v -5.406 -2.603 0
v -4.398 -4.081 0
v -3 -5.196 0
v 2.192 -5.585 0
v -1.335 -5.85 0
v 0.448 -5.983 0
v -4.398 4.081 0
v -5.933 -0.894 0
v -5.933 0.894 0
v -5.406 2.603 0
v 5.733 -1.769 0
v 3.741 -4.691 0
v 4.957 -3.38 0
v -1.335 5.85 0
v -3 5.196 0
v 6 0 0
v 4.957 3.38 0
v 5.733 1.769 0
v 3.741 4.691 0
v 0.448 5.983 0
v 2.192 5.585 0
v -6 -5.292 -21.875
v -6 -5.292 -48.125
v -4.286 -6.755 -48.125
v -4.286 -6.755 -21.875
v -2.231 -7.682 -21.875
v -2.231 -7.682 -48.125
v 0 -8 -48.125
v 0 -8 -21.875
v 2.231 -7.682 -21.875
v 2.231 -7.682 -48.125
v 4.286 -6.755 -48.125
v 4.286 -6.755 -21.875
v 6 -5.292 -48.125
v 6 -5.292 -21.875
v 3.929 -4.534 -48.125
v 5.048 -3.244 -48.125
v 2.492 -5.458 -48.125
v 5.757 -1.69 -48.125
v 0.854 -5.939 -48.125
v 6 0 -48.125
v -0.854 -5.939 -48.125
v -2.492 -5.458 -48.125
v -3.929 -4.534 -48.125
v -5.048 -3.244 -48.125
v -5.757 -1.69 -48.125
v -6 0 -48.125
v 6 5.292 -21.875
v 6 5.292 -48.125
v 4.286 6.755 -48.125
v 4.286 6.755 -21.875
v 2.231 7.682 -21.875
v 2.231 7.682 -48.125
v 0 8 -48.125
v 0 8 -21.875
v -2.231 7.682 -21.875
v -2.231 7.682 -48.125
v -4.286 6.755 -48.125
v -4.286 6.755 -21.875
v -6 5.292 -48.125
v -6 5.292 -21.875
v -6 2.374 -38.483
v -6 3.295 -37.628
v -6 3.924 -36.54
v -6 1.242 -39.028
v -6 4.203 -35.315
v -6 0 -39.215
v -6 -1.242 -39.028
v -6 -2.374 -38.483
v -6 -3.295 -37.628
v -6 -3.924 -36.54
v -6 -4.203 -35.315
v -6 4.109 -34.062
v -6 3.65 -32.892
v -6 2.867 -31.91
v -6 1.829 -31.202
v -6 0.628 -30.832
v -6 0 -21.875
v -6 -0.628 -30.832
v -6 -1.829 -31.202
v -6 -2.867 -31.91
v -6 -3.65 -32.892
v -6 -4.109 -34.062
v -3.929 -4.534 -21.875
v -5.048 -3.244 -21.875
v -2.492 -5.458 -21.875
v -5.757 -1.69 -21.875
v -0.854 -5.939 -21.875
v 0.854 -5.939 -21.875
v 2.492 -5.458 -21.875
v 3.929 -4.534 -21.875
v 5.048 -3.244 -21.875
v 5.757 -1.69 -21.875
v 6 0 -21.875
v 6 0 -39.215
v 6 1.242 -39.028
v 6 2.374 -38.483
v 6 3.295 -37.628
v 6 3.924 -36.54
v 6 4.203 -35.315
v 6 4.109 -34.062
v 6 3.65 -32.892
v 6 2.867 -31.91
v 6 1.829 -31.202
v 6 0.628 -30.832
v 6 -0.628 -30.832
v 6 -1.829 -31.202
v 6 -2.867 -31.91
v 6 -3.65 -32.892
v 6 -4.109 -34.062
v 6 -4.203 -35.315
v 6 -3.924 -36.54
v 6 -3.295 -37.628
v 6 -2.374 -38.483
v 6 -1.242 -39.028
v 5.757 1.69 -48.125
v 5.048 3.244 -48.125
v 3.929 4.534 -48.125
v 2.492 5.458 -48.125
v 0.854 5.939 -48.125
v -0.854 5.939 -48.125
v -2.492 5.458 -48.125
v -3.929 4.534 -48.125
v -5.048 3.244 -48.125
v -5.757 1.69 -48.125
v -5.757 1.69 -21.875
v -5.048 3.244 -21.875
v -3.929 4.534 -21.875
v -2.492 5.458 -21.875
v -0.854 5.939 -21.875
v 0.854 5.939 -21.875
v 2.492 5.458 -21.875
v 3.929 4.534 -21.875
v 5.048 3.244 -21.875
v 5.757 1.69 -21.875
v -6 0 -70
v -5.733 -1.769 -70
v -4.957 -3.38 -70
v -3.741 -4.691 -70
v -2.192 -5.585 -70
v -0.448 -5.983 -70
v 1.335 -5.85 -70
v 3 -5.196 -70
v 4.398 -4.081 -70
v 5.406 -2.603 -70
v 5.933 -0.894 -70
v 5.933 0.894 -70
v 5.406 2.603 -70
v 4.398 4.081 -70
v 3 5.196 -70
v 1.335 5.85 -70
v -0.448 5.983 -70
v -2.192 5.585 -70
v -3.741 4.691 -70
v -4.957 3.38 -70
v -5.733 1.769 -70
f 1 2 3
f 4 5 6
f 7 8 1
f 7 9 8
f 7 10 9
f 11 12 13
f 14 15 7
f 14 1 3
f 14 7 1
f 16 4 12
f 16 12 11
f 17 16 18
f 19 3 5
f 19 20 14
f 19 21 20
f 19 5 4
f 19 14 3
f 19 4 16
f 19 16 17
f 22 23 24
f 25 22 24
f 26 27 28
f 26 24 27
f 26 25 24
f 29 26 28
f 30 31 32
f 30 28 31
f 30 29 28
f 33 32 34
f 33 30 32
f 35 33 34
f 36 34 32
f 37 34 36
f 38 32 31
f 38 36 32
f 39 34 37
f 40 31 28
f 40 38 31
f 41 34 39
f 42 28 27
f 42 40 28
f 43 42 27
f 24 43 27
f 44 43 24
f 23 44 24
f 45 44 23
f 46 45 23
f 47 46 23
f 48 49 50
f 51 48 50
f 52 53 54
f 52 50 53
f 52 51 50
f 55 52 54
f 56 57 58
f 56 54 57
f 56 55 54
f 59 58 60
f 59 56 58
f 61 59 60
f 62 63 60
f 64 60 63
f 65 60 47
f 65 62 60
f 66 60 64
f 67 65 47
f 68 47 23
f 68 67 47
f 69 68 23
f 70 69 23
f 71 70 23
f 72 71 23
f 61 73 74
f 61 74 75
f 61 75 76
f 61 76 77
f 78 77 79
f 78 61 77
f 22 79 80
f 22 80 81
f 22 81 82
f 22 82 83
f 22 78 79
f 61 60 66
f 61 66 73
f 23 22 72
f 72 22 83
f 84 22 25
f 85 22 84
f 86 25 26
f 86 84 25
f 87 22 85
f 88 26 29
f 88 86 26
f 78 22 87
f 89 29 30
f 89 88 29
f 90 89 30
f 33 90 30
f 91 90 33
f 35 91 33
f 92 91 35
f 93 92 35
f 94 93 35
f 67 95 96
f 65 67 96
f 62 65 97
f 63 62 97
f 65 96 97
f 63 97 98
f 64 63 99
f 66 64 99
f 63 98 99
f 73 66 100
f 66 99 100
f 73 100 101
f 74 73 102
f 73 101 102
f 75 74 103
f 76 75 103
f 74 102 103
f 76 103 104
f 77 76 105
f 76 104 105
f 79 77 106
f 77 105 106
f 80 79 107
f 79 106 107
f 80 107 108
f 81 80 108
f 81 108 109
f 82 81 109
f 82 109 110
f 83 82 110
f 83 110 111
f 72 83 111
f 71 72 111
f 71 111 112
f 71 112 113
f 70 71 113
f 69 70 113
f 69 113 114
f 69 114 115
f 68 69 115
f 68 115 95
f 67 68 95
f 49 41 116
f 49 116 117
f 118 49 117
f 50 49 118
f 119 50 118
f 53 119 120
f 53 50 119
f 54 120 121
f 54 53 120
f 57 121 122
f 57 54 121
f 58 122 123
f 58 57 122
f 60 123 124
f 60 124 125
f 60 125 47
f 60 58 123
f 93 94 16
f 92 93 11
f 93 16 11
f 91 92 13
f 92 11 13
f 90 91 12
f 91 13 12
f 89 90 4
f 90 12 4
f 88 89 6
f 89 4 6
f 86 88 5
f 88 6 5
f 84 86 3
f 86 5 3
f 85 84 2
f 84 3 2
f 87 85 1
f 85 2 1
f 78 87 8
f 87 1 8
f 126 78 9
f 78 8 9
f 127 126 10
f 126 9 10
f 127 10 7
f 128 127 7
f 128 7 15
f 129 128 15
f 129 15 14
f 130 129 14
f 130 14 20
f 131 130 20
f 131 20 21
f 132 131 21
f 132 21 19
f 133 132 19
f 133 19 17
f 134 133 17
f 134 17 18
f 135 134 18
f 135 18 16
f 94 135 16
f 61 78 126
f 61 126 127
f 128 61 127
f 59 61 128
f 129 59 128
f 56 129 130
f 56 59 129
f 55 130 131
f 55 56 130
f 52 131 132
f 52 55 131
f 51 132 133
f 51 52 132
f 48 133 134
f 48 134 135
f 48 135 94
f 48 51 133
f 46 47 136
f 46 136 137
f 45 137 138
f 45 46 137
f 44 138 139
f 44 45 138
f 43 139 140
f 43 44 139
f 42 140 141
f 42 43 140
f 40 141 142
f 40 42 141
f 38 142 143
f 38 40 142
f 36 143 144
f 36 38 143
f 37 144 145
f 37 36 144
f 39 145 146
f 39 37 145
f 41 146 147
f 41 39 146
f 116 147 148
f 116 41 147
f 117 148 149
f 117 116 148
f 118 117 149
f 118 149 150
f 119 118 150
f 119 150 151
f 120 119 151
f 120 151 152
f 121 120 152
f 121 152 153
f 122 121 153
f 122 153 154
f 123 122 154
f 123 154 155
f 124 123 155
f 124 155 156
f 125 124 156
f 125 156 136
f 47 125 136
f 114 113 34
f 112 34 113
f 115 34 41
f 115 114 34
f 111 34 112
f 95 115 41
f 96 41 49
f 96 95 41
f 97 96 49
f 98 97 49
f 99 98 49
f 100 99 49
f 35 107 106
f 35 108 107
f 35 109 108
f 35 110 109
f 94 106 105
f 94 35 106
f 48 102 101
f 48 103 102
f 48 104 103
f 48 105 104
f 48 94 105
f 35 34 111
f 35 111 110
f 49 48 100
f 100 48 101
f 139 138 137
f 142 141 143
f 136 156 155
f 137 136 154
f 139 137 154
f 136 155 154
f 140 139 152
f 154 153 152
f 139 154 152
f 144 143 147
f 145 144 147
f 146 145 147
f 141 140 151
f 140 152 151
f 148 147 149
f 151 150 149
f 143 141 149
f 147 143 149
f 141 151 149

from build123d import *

# Parameters (mm, degrees)
SKETCH2_R           = 6
BOSS_EXTRUDE2_DEPTH = 70
CUT_EXTRUDE1_DEPTH  = 21.875
CUT_EXTRUDE3_START  = -21.875
CUT_EXTRUDE3_DEPTH  = 21.875
SKETCH4_R           = 4.215
CUT_EXTRUDE4_DEPTH  = 72.470273541


with BuildPart() as part:
    # Sketch2 → Boss-Extrude2 (new body)
    with BuildSketch(Plane.XY):
        with BuildLine():
            ThreePointArc((-6, 0), (0, 6), (6, 0))
            Line((6, 0), (6, 5.291502622))
            ThreePointArc((6, 5.291502622), (0, 8), (-6, 5.291502622))
            Line((-6, 5.291502622), (-6, 0))
        make_face()
        Circle(SKETCH2_R)
        with BuildLine():
            Line((6, -5.291502622), (6, 0))
            ThreePointArc((6, 0), (0, -6), (-6, 0))
            Line((-6, 0), (-6, -5.291502622))
            ThreePointArc((-6, -5.291502622), (0, -8), (6, -5.291502622))
        make_face()
    extrude(amount=-BOSS_EXTRUDE2_DEPTH)

    # Sketch5 → Cut-Extrude1 (cut)
    with BuildSketch(Plane.XY):
        with BuildLine():
            ThreePointArc((6, 5.291502622), (0, 8), (-6, 5.291502622))
            Line((-6, 5.291502622), (-6, -5e-09))
            ThreePointArc((-6, -5e-09), (-2e-09, 6), (6, 0))
            Line((6, 0), (6, 5.291502622))
        make_face()
        with BuildLine():
            ThreePointArc((6, 0), (2e-09, -6), (-6, -5e-09))
            Line((-6, -5e-09), (-6, -5.291502622))
            ThreePointArc((-6, -5.291502622), (0, -8), (6, -5.291502622))
            Line((6, -5.291502622), (6, 0))
        make_face()
    extrude(amount=-CUT_EXTRUDE1_DEPTH, mode=Mode.SUBTRACT)

    # Sketch6 → Cut-Extrude3 (cut)
    with BuildSketch(Plane(origin=(0, 0, -70), x_dir=(-1, 0, 0), z_dir=(0, 0, -1)).offset(CUT_EXTRUDE3_START)):
        with BuildLine():
            ThreePointArc((6, 5.291502622), (0, 8), (-6, 5.291502622))
            Line((-6, 5.291502622), (-6, -5e-09))
            ThreePointArc((-6, -5e-09), (-2e-09, 6), (6, 0))
            Line((6, 0), (6, 5.291502622))
        make_face()
        with BuildLine():
            ThreePointArc((6, 0), (2e-09, -6), (-6, -5e-09))
            Line((-6, -5e-09), (-6, -5.291502622))
            ThreePointArc((-6, -5.291502622), (0, -8), (6, -5.291502622))
            Line((6, -5.291502622), (6, 0))
        make_face()
    extrude(amount=CUT_EXTRUDE3_DEPTH, mode=Mode.SUBTRACT)

    # Sketch4 → Cut-Extrude4 (cut, through all)
    with BuildSketch(Plane(origin=(6, 0, 0), x_dir=(0, 0, -1), z_dir=(1, 0, 0))):
        with Locations((35, 0)):
            Circle(SKETCH4_R)
    extrude(amount=-CUT_EXTRUDE4_DEPTH, mode=Mode.SUBTRACT)


solid = part.part
